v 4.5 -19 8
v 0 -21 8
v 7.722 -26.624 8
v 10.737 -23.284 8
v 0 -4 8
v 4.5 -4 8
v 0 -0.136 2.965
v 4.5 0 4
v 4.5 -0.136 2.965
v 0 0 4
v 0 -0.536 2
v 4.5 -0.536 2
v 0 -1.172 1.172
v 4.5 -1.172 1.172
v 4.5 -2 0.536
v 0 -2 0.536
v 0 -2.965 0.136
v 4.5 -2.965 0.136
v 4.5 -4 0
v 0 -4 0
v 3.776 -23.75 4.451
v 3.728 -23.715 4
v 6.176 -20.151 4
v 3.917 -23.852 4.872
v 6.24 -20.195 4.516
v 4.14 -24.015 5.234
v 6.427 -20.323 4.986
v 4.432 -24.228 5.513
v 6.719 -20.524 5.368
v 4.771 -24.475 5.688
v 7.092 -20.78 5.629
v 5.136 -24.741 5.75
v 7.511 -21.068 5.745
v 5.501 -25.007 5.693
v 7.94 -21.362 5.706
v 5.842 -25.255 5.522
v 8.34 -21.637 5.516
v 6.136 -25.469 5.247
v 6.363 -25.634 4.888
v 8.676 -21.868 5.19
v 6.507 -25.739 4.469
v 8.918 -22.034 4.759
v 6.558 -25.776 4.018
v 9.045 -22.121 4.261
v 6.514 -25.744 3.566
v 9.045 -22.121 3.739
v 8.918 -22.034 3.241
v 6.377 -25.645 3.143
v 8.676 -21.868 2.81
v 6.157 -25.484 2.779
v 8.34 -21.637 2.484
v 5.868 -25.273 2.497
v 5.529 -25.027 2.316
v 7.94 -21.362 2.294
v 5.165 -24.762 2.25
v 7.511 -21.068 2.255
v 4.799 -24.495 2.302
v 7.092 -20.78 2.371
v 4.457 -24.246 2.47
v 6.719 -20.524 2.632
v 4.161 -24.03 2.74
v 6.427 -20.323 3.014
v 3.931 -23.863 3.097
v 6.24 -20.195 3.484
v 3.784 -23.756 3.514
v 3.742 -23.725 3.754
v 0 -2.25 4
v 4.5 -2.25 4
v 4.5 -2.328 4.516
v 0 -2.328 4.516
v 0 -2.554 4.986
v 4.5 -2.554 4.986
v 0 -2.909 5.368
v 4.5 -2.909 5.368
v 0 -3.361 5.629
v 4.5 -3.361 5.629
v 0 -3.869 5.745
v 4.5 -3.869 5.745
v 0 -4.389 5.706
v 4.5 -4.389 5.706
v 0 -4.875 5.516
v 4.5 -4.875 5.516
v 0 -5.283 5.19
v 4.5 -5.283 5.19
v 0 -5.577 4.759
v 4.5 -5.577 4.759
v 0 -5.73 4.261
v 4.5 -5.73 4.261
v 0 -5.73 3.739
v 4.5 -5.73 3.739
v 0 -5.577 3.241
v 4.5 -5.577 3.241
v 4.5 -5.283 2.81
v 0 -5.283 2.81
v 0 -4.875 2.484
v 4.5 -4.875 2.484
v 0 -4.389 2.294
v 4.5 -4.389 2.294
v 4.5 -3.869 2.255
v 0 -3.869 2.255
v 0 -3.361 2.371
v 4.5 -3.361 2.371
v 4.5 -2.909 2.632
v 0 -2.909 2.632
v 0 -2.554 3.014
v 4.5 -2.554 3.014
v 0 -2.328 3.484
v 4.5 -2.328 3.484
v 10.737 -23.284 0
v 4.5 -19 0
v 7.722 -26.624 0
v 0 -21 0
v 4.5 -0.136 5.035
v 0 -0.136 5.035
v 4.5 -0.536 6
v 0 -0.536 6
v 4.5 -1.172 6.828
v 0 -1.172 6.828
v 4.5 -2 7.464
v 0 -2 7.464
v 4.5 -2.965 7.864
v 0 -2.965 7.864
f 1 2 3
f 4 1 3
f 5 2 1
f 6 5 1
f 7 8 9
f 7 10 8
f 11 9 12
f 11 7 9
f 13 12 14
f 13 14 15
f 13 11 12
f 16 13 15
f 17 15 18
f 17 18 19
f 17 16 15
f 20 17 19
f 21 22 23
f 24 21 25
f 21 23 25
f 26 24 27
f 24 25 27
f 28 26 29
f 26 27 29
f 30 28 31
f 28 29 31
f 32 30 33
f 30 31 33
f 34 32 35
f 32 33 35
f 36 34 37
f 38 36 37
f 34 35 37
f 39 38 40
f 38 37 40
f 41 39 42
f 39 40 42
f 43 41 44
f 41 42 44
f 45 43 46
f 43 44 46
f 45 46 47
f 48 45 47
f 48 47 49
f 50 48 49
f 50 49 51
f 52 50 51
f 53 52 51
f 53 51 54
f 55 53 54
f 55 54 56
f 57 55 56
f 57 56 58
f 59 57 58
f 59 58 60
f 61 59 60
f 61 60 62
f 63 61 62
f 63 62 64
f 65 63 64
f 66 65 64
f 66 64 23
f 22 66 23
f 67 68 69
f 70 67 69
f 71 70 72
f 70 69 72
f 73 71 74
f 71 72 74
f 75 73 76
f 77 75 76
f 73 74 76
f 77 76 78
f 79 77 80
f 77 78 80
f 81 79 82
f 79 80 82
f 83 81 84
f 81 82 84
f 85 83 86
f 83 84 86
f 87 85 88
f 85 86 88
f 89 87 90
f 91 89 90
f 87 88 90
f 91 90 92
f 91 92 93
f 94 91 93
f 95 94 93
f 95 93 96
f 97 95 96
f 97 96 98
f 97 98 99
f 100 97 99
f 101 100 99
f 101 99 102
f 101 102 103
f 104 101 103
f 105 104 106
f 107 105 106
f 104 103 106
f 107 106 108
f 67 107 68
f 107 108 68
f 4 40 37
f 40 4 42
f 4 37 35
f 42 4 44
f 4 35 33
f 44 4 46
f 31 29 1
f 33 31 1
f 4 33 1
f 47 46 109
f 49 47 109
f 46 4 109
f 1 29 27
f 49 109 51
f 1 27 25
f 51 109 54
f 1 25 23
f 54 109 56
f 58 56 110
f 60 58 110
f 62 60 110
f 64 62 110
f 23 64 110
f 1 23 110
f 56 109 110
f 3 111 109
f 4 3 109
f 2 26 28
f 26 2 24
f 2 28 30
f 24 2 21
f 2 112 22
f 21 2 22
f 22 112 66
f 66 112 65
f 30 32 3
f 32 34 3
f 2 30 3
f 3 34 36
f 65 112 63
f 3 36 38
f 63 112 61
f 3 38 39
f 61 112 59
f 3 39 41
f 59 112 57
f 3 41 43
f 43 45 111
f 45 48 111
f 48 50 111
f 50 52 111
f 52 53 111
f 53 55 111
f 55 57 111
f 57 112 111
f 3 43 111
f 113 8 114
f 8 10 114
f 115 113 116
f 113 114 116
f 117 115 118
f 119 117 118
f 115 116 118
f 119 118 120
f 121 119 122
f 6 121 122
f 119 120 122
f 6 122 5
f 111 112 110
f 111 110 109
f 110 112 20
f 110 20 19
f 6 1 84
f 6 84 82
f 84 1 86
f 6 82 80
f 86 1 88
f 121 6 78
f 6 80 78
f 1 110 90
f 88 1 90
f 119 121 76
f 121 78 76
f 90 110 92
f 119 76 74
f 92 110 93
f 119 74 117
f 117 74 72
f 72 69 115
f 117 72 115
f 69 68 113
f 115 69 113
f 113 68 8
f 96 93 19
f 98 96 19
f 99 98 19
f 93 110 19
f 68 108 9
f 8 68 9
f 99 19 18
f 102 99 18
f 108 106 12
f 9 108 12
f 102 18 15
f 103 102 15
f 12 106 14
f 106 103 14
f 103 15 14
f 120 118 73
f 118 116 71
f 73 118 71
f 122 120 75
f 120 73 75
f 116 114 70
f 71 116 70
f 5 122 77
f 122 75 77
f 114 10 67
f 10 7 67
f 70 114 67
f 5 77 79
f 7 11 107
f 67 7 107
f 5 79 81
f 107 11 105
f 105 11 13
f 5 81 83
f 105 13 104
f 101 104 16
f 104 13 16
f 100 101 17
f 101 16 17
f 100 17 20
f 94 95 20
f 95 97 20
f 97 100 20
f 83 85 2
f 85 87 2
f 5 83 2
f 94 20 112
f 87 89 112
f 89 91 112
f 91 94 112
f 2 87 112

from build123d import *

# Parameters (mm, degrees)
F1_DEPTH = 8
F2_R     = 3.99999
F3_R     = 1.75
F4_DEPTH = 4.5
F5_R     = 1.75
F6_DEPTH = 4.84


# Not quite as in the source:
# - a fillet or chamfer is up to 0.001 mm smaller than in the source, because OpenCascade refuses the exact size
# - a feature names something its author has since deleted; it is built from what else it names


with BuildPart() as f1:
    # F0 (on Top) → F1 (new body)
    with BuildSketch(Plane.XY):
        Polygon((4.5, 0), (0, 0), (0, -21), (7.7216494845, -26.6237113402), (10.7371134021, -23.2835051546), (4.5, -19), align=None)
    extrude(amount=F1_DEPTH)

    # F2 (radius 4 in the source; OpenCascade refuses exactly that, so slightly less here)
    f2_edges = [f1.edges().sort_by_distance(p)[0] for p in [
        (2.25, 0, 8),
        (2.25, 0, 0),
    ]]
    fillet(f2_edges, radius=F2_R)

    # F3 (on face) → F4 (cut)
    with BuildSketch(Plane.YZ.offset(4.5)):
        with Locations((-4, 4)):
            Circle(F3_R)
    extrude(amount=-F4_DEPTH, mode=Mode.SUBTRACT)

    # F5 (on face) → F6 (cut)
    with BuildSketch(Plane(origin=(-7.4244465835, -10.8105660241, 0), x_dir=(-0.8243201098, 0.5661239763, 0), z_dir=(0.5661239763, 0.8243201098, 0))):
        with Locations((-18.248982531, 4)):
            Circle(F5_R)
    extrude(amount=-F6_DEPTH, mode=Mode.SUBTRACT)


solid = f1.part
